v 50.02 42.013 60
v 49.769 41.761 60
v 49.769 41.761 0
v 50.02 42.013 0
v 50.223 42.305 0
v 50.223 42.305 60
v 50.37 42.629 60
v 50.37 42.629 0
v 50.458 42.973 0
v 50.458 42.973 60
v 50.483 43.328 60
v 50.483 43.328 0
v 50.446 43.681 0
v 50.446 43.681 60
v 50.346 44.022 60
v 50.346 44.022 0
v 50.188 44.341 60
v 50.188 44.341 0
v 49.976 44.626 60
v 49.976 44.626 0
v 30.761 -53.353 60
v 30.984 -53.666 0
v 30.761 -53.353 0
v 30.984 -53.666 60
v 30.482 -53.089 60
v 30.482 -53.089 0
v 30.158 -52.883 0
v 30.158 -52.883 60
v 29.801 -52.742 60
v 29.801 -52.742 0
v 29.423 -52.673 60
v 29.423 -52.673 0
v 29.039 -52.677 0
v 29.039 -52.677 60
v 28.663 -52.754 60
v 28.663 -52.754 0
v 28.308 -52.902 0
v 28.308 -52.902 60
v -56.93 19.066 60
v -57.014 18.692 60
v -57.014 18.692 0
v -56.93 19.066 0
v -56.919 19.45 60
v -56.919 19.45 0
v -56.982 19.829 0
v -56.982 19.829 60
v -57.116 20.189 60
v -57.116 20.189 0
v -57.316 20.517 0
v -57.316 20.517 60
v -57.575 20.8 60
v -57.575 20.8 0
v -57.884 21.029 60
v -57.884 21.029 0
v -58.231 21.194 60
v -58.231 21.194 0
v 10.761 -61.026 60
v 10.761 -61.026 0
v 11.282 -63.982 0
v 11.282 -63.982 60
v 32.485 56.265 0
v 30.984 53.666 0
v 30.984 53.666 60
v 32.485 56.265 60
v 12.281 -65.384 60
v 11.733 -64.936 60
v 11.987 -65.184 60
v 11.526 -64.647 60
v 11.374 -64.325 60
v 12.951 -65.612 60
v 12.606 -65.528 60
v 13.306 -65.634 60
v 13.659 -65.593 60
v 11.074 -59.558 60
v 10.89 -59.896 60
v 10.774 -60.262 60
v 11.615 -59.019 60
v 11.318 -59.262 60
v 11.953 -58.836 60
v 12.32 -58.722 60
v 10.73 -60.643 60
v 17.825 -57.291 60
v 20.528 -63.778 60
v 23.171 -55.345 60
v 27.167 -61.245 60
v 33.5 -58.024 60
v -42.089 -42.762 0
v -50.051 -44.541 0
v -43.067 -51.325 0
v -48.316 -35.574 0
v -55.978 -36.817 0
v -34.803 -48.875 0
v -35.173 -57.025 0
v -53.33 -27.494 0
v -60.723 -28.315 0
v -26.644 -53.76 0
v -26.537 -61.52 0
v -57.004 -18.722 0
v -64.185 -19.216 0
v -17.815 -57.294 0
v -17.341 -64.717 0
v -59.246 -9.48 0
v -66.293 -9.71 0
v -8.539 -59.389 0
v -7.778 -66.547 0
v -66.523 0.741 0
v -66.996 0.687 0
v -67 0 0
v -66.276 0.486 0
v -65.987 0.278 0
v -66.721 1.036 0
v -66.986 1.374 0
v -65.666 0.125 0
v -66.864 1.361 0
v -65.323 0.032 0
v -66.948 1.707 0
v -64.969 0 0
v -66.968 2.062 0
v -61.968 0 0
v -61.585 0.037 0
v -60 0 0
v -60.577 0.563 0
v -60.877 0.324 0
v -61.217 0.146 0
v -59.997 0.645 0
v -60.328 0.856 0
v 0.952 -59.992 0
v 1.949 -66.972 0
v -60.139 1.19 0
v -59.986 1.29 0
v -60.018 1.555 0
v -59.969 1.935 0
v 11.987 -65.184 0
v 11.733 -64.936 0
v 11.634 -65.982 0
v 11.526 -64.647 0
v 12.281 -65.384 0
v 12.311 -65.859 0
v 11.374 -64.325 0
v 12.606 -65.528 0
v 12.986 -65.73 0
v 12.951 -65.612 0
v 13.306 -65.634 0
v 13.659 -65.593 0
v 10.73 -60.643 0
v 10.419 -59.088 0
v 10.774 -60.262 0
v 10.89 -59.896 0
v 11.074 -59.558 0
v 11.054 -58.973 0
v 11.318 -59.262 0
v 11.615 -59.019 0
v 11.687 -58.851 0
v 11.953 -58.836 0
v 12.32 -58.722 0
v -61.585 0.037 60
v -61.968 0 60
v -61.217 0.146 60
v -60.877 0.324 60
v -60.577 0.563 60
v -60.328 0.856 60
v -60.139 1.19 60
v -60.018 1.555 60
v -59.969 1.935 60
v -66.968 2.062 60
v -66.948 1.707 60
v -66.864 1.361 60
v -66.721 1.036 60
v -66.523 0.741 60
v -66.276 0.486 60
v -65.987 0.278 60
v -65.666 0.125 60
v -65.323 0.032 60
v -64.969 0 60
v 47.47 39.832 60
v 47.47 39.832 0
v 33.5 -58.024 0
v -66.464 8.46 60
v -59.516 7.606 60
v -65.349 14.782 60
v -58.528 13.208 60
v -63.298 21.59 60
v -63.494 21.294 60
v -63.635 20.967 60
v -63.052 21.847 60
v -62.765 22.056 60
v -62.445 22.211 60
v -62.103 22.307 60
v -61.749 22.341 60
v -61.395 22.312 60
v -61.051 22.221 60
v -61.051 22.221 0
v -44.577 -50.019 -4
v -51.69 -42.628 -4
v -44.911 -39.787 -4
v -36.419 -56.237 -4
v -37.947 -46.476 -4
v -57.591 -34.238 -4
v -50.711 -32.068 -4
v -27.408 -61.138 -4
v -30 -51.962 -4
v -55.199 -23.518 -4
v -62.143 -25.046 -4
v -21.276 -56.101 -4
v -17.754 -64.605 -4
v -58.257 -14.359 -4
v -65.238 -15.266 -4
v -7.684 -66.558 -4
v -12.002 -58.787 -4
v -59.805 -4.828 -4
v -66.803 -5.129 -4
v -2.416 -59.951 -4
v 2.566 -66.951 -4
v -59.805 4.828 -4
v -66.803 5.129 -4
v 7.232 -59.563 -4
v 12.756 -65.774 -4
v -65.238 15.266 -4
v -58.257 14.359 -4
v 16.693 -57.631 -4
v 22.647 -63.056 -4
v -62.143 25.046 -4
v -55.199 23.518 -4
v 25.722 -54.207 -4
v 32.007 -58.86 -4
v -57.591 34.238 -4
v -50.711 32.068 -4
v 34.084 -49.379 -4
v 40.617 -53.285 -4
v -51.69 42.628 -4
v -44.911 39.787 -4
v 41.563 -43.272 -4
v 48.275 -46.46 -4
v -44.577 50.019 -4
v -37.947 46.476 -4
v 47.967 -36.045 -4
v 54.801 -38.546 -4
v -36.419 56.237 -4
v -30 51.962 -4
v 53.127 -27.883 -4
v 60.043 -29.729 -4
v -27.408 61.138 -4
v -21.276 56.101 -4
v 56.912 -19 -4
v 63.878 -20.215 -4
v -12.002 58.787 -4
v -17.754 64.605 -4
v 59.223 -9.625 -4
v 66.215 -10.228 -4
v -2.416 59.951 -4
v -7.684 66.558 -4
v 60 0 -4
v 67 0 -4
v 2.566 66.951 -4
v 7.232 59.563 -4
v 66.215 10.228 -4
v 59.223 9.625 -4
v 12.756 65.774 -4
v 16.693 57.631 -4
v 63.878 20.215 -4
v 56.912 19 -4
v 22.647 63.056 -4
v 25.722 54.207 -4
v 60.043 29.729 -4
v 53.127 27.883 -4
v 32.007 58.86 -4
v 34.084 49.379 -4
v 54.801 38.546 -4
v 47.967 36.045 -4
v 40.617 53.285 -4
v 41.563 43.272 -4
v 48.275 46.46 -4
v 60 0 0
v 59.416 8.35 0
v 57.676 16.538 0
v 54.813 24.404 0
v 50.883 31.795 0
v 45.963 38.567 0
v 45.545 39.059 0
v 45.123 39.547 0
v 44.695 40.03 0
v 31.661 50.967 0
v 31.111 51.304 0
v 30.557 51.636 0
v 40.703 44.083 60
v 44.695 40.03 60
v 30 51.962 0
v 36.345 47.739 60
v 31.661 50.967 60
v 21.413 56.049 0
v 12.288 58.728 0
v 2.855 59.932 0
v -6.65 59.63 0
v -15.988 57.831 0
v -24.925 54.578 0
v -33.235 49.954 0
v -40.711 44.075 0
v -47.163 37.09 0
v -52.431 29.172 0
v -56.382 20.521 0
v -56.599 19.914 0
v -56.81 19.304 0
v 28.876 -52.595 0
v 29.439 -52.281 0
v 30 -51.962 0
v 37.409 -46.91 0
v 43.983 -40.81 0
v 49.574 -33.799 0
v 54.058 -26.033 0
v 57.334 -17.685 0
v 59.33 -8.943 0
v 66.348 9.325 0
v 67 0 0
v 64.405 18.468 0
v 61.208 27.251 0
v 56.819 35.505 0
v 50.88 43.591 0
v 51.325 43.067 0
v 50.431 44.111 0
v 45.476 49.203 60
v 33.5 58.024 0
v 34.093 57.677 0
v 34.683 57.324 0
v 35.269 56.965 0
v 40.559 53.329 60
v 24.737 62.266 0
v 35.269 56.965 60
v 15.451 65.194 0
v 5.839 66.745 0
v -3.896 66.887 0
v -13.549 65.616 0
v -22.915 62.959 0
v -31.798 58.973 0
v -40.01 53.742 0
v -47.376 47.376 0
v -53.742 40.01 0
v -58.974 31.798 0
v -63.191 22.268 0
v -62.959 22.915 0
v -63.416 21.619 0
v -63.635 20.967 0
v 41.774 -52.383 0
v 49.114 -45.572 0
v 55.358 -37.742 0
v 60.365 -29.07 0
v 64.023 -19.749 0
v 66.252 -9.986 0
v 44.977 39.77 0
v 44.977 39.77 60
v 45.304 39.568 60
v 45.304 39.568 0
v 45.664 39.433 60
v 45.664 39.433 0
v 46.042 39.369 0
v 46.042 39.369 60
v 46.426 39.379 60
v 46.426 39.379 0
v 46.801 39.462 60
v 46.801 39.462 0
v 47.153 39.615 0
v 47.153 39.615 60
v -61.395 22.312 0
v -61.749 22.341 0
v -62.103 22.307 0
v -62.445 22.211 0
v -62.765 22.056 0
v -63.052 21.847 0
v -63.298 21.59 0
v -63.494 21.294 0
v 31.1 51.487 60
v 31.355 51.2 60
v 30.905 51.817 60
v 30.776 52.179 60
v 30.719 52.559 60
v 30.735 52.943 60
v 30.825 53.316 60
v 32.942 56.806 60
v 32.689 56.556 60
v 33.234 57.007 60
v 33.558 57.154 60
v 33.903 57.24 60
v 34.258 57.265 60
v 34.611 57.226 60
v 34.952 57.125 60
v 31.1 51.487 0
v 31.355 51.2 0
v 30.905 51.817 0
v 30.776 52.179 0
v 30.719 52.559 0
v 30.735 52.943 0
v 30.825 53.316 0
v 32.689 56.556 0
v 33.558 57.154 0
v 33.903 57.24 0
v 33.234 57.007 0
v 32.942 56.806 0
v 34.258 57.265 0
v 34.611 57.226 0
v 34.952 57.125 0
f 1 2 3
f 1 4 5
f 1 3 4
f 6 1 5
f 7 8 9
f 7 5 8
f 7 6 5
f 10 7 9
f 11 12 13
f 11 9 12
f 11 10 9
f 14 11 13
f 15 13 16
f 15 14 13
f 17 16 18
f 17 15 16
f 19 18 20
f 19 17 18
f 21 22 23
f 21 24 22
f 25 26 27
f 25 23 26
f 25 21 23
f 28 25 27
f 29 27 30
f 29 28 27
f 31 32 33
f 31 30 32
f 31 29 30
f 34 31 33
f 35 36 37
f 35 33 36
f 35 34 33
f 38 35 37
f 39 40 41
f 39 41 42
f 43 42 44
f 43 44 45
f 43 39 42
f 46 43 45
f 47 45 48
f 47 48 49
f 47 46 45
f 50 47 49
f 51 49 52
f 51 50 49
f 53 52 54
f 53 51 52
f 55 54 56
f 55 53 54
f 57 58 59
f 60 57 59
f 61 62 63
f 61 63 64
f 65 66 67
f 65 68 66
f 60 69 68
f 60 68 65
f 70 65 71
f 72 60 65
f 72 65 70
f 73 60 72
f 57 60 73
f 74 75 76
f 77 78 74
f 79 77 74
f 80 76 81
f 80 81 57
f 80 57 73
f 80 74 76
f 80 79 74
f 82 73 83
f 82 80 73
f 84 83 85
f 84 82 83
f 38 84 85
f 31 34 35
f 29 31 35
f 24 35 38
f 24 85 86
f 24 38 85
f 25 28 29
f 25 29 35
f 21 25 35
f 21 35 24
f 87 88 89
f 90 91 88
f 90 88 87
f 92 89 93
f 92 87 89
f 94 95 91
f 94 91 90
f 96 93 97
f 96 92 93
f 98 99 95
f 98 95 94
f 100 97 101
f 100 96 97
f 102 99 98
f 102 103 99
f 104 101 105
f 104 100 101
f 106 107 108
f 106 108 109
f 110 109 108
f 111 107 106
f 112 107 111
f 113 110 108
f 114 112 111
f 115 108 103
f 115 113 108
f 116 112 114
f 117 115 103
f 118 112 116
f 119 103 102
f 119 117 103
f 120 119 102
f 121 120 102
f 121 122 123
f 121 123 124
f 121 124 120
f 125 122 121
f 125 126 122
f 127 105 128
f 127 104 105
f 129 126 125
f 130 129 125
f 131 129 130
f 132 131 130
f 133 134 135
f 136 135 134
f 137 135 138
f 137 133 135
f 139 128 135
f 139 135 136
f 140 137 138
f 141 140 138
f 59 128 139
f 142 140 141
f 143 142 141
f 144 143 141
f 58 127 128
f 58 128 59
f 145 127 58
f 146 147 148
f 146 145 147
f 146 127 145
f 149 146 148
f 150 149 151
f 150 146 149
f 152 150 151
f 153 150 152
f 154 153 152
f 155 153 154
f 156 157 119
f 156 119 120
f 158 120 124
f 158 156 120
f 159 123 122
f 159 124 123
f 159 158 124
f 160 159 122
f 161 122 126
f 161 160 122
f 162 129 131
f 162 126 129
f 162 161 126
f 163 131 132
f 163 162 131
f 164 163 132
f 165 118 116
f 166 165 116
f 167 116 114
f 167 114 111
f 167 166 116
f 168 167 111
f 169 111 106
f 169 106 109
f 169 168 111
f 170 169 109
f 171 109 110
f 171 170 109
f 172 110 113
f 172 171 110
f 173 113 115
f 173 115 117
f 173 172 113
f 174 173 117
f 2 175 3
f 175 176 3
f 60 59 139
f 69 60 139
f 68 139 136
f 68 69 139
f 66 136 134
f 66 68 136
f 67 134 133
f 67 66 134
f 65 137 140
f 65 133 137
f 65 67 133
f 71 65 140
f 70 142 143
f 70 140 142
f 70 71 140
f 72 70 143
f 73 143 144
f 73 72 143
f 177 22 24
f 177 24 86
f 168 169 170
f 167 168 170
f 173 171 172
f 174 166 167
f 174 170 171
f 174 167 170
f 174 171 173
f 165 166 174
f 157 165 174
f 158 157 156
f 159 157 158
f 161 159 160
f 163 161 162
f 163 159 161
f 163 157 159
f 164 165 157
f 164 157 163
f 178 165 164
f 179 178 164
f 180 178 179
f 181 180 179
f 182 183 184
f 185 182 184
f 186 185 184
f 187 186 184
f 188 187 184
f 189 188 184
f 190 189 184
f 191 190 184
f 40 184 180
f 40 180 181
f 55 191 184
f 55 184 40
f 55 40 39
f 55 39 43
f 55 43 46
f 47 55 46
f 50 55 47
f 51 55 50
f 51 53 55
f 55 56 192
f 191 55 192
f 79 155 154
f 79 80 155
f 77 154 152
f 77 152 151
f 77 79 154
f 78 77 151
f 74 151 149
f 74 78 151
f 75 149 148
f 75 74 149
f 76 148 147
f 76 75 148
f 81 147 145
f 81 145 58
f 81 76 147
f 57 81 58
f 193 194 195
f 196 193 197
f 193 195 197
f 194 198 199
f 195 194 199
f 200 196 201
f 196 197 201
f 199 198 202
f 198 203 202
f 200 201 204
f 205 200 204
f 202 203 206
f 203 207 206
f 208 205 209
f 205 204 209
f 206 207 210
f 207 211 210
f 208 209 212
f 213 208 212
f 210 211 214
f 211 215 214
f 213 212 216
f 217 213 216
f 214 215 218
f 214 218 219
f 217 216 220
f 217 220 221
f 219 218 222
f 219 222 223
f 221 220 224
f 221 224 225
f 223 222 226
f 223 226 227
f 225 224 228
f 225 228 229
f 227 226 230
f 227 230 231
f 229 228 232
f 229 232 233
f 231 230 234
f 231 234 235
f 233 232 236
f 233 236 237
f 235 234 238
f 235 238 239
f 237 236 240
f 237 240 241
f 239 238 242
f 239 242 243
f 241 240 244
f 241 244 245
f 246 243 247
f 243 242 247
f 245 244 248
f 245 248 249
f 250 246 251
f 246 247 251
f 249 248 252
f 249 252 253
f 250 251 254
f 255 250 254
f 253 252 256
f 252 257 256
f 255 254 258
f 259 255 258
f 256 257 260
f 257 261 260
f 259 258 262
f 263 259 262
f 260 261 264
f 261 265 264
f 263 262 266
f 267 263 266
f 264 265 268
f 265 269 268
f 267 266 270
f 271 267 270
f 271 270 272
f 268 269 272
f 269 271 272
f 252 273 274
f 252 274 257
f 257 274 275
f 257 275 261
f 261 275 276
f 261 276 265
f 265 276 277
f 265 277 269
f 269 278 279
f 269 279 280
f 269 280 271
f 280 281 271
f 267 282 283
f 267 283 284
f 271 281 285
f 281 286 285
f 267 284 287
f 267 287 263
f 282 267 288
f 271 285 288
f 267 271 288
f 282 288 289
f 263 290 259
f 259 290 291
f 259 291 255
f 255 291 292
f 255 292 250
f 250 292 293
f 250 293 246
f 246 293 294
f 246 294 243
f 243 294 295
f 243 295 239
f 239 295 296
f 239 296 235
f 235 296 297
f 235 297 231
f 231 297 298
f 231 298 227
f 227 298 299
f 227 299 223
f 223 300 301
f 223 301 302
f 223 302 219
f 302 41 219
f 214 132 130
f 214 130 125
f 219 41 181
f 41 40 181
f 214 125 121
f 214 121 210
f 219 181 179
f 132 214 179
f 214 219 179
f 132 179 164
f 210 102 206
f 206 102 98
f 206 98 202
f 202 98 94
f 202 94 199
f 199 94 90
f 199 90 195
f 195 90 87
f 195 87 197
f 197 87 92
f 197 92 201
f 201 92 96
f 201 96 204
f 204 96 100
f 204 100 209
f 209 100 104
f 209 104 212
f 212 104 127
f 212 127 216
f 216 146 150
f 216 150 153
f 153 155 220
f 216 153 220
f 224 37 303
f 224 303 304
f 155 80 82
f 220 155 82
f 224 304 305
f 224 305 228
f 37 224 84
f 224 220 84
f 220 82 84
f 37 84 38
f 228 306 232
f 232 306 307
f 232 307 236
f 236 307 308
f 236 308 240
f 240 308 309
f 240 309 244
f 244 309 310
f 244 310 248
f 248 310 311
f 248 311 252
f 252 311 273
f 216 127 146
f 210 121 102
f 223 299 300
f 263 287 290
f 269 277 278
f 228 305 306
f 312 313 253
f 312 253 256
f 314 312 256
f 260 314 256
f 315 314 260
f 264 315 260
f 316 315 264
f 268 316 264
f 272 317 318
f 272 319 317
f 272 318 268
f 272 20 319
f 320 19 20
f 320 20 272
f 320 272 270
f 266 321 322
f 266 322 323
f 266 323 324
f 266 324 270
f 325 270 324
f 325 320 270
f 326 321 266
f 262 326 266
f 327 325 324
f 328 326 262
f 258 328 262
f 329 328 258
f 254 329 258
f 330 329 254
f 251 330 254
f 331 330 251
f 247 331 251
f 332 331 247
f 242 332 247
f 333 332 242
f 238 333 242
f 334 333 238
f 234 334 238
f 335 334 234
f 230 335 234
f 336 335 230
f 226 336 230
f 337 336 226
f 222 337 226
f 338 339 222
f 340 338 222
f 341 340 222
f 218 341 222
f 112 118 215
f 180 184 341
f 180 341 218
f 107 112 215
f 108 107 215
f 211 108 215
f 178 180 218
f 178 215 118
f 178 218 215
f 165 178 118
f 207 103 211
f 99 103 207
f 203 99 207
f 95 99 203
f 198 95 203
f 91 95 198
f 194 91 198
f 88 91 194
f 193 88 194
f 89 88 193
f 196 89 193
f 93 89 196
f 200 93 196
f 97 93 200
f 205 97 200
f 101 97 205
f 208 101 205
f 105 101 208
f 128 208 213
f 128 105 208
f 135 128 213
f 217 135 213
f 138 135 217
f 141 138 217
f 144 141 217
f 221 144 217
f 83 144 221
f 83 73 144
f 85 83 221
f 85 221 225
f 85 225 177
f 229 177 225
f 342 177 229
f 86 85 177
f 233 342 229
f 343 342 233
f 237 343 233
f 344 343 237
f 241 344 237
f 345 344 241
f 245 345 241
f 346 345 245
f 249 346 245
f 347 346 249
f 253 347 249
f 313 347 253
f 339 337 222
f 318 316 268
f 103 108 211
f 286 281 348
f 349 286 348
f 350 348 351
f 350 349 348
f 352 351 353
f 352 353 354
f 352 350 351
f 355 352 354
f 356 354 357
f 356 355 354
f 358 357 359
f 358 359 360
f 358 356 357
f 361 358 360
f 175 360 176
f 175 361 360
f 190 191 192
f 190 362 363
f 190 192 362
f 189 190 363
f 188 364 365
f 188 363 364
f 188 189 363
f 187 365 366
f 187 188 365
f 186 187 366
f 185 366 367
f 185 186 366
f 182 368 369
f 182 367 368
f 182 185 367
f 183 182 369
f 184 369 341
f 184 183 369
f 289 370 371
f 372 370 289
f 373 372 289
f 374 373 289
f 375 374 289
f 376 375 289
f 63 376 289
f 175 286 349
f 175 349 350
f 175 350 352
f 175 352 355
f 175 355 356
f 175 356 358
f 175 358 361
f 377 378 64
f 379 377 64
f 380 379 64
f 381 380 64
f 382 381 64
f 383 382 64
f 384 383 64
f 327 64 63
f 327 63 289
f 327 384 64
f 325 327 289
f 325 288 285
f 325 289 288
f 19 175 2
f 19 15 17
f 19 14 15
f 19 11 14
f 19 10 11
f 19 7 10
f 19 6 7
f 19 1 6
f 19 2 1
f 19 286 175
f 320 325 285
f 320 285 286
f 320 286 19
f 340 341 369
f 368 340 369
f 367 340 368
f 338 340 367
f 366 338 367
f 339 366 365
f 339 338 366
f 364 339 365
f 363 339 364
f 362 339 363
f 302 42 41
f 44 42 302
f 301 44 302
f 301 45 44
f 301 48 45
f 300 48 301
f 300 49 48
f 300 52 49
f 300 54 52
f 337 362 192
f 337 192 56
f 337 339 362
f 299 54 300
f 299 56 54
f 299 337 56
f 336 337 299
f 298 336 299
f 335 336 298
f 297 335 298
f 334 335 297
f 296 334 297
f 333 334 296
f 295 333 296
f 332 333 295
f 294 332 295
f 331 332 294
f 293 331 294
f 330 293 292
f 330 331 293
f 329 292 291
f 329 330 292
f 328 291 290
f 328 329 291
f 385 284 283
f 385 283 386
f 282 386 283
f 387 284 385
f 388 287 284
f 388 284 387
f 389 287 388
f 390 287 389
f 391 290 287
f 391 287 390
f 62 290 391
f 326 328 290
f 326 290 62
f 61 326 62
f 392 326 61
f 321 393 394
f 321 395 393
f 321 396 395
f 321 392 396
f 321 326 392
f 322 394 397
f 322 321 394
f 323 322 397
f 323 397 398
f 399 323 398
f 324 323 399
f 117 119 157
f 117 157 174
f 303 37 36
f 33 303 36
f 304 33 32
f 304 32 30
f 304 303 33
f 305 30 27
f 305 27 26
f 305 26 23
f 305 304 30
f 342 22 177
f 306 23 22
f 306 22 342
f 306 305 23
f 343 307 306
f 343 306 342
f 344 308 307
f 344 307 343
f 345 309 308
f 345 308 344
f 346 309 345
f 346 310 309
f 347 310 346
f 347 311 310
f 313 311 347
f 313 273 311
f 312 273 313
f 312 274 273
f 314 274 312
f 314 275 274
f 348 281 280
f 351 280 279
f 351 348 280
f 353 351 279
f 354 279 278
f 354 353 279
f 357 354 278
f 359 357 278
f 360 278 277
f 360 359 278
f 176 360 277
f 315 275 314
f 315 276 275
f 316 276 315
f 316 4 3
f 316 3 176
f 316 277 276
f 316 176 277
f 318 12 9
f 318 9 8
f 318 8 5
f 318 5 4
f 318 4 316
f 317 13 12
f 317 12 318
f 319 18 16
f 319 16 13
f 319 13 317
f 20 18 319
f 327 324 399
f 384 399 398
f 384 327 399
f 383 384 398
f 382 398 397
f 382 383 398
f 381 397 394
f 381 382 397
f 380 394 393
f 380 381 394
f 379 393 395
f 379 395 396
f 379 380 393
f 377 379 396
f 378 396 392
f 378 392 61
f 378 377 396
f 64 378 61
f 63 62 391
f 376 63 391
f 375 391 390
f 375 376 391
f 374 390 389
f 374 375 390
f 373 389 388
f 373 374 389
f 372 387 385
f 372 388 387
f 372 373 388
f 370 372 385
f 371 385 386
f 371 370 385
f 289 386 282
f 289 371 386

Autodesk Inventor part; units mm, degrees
ref_plane "YZ Plane" through (0, 0, 0) normal (1, 0, 0) x (0, 1, 0)
ref_plane "XZ Plane" through (0, 0, 0) normal (0, 1, 0) x (-1, 0, 0)
ref_plane "XY Plane" through (0, 0, 0) normal (0, 0, 1) x (1, 0, 0)
sketch "Sketch1" plane through (0, 0, 0) normal (0, 0, 1) x (1, 0, 0)
  circle A0 centre (0, 0) radius 67
  circle A1 centre (0, 0) radius 60
  line L0 (0, 0) -> (-67, 0)
  line L1 (0, 0) -> (-62.9594, 22.9153)
  line L2 (0, 0) -> (67, 0) construction
  line L3 (0, 0) -> (33.5, -58.0237)
  line L4 (0, 0) -> (11.6344, -65.9821)
  line L5 (0, 0) -> (33.5, 58.0237)
  line L6 (0, 0) -> (51.325, 43.0668)
  point P0 (10.4189, -59.0885)
  point P1 (30, -51.9615)
  point P2 (45.9627, 38.5673)
  point P3 (30, 51.9615)
  point P4 (-56.3816, 20.5212)
  point P5 (-60, 0)
  dimension "d0" = 134
  dimension "d1" = 120
  dimension "d2" = 160
  dimension "d5" = 360
extrude "Extrusion1" add sketch "Sketch1" against normal blind 4 contours A0 L3 A1 L6 | L6 A1 L5 A0 | A0 L4 A1 L3 | L5 A1 L1 A0 | A0 L0 A1 L4 | L1 A1 L0 A0
extrude "Extrusion2" add sketch "Sketch1" along normal blind 60 contours L6 A1 L5 A0 | A0 L4 A1 L3 | L1 A1 L0 A0
fillet "Fillet1" radius 2 11 edges at (-62.9594, 22.9153, 30) (-67, 0, 30) (-56.3816, 20.5212, 30) (-60, 0, 30) (33.5, 58.0237, 30) (51.325, 43.0668, 30) (45.9627, 38.5673, 30) (30, 51.9615, 30) (11.6344, -65.9821, 30) (10.4189, -59.0885, 30) (30, -51.9615, 30)
properties part number "Stand"
